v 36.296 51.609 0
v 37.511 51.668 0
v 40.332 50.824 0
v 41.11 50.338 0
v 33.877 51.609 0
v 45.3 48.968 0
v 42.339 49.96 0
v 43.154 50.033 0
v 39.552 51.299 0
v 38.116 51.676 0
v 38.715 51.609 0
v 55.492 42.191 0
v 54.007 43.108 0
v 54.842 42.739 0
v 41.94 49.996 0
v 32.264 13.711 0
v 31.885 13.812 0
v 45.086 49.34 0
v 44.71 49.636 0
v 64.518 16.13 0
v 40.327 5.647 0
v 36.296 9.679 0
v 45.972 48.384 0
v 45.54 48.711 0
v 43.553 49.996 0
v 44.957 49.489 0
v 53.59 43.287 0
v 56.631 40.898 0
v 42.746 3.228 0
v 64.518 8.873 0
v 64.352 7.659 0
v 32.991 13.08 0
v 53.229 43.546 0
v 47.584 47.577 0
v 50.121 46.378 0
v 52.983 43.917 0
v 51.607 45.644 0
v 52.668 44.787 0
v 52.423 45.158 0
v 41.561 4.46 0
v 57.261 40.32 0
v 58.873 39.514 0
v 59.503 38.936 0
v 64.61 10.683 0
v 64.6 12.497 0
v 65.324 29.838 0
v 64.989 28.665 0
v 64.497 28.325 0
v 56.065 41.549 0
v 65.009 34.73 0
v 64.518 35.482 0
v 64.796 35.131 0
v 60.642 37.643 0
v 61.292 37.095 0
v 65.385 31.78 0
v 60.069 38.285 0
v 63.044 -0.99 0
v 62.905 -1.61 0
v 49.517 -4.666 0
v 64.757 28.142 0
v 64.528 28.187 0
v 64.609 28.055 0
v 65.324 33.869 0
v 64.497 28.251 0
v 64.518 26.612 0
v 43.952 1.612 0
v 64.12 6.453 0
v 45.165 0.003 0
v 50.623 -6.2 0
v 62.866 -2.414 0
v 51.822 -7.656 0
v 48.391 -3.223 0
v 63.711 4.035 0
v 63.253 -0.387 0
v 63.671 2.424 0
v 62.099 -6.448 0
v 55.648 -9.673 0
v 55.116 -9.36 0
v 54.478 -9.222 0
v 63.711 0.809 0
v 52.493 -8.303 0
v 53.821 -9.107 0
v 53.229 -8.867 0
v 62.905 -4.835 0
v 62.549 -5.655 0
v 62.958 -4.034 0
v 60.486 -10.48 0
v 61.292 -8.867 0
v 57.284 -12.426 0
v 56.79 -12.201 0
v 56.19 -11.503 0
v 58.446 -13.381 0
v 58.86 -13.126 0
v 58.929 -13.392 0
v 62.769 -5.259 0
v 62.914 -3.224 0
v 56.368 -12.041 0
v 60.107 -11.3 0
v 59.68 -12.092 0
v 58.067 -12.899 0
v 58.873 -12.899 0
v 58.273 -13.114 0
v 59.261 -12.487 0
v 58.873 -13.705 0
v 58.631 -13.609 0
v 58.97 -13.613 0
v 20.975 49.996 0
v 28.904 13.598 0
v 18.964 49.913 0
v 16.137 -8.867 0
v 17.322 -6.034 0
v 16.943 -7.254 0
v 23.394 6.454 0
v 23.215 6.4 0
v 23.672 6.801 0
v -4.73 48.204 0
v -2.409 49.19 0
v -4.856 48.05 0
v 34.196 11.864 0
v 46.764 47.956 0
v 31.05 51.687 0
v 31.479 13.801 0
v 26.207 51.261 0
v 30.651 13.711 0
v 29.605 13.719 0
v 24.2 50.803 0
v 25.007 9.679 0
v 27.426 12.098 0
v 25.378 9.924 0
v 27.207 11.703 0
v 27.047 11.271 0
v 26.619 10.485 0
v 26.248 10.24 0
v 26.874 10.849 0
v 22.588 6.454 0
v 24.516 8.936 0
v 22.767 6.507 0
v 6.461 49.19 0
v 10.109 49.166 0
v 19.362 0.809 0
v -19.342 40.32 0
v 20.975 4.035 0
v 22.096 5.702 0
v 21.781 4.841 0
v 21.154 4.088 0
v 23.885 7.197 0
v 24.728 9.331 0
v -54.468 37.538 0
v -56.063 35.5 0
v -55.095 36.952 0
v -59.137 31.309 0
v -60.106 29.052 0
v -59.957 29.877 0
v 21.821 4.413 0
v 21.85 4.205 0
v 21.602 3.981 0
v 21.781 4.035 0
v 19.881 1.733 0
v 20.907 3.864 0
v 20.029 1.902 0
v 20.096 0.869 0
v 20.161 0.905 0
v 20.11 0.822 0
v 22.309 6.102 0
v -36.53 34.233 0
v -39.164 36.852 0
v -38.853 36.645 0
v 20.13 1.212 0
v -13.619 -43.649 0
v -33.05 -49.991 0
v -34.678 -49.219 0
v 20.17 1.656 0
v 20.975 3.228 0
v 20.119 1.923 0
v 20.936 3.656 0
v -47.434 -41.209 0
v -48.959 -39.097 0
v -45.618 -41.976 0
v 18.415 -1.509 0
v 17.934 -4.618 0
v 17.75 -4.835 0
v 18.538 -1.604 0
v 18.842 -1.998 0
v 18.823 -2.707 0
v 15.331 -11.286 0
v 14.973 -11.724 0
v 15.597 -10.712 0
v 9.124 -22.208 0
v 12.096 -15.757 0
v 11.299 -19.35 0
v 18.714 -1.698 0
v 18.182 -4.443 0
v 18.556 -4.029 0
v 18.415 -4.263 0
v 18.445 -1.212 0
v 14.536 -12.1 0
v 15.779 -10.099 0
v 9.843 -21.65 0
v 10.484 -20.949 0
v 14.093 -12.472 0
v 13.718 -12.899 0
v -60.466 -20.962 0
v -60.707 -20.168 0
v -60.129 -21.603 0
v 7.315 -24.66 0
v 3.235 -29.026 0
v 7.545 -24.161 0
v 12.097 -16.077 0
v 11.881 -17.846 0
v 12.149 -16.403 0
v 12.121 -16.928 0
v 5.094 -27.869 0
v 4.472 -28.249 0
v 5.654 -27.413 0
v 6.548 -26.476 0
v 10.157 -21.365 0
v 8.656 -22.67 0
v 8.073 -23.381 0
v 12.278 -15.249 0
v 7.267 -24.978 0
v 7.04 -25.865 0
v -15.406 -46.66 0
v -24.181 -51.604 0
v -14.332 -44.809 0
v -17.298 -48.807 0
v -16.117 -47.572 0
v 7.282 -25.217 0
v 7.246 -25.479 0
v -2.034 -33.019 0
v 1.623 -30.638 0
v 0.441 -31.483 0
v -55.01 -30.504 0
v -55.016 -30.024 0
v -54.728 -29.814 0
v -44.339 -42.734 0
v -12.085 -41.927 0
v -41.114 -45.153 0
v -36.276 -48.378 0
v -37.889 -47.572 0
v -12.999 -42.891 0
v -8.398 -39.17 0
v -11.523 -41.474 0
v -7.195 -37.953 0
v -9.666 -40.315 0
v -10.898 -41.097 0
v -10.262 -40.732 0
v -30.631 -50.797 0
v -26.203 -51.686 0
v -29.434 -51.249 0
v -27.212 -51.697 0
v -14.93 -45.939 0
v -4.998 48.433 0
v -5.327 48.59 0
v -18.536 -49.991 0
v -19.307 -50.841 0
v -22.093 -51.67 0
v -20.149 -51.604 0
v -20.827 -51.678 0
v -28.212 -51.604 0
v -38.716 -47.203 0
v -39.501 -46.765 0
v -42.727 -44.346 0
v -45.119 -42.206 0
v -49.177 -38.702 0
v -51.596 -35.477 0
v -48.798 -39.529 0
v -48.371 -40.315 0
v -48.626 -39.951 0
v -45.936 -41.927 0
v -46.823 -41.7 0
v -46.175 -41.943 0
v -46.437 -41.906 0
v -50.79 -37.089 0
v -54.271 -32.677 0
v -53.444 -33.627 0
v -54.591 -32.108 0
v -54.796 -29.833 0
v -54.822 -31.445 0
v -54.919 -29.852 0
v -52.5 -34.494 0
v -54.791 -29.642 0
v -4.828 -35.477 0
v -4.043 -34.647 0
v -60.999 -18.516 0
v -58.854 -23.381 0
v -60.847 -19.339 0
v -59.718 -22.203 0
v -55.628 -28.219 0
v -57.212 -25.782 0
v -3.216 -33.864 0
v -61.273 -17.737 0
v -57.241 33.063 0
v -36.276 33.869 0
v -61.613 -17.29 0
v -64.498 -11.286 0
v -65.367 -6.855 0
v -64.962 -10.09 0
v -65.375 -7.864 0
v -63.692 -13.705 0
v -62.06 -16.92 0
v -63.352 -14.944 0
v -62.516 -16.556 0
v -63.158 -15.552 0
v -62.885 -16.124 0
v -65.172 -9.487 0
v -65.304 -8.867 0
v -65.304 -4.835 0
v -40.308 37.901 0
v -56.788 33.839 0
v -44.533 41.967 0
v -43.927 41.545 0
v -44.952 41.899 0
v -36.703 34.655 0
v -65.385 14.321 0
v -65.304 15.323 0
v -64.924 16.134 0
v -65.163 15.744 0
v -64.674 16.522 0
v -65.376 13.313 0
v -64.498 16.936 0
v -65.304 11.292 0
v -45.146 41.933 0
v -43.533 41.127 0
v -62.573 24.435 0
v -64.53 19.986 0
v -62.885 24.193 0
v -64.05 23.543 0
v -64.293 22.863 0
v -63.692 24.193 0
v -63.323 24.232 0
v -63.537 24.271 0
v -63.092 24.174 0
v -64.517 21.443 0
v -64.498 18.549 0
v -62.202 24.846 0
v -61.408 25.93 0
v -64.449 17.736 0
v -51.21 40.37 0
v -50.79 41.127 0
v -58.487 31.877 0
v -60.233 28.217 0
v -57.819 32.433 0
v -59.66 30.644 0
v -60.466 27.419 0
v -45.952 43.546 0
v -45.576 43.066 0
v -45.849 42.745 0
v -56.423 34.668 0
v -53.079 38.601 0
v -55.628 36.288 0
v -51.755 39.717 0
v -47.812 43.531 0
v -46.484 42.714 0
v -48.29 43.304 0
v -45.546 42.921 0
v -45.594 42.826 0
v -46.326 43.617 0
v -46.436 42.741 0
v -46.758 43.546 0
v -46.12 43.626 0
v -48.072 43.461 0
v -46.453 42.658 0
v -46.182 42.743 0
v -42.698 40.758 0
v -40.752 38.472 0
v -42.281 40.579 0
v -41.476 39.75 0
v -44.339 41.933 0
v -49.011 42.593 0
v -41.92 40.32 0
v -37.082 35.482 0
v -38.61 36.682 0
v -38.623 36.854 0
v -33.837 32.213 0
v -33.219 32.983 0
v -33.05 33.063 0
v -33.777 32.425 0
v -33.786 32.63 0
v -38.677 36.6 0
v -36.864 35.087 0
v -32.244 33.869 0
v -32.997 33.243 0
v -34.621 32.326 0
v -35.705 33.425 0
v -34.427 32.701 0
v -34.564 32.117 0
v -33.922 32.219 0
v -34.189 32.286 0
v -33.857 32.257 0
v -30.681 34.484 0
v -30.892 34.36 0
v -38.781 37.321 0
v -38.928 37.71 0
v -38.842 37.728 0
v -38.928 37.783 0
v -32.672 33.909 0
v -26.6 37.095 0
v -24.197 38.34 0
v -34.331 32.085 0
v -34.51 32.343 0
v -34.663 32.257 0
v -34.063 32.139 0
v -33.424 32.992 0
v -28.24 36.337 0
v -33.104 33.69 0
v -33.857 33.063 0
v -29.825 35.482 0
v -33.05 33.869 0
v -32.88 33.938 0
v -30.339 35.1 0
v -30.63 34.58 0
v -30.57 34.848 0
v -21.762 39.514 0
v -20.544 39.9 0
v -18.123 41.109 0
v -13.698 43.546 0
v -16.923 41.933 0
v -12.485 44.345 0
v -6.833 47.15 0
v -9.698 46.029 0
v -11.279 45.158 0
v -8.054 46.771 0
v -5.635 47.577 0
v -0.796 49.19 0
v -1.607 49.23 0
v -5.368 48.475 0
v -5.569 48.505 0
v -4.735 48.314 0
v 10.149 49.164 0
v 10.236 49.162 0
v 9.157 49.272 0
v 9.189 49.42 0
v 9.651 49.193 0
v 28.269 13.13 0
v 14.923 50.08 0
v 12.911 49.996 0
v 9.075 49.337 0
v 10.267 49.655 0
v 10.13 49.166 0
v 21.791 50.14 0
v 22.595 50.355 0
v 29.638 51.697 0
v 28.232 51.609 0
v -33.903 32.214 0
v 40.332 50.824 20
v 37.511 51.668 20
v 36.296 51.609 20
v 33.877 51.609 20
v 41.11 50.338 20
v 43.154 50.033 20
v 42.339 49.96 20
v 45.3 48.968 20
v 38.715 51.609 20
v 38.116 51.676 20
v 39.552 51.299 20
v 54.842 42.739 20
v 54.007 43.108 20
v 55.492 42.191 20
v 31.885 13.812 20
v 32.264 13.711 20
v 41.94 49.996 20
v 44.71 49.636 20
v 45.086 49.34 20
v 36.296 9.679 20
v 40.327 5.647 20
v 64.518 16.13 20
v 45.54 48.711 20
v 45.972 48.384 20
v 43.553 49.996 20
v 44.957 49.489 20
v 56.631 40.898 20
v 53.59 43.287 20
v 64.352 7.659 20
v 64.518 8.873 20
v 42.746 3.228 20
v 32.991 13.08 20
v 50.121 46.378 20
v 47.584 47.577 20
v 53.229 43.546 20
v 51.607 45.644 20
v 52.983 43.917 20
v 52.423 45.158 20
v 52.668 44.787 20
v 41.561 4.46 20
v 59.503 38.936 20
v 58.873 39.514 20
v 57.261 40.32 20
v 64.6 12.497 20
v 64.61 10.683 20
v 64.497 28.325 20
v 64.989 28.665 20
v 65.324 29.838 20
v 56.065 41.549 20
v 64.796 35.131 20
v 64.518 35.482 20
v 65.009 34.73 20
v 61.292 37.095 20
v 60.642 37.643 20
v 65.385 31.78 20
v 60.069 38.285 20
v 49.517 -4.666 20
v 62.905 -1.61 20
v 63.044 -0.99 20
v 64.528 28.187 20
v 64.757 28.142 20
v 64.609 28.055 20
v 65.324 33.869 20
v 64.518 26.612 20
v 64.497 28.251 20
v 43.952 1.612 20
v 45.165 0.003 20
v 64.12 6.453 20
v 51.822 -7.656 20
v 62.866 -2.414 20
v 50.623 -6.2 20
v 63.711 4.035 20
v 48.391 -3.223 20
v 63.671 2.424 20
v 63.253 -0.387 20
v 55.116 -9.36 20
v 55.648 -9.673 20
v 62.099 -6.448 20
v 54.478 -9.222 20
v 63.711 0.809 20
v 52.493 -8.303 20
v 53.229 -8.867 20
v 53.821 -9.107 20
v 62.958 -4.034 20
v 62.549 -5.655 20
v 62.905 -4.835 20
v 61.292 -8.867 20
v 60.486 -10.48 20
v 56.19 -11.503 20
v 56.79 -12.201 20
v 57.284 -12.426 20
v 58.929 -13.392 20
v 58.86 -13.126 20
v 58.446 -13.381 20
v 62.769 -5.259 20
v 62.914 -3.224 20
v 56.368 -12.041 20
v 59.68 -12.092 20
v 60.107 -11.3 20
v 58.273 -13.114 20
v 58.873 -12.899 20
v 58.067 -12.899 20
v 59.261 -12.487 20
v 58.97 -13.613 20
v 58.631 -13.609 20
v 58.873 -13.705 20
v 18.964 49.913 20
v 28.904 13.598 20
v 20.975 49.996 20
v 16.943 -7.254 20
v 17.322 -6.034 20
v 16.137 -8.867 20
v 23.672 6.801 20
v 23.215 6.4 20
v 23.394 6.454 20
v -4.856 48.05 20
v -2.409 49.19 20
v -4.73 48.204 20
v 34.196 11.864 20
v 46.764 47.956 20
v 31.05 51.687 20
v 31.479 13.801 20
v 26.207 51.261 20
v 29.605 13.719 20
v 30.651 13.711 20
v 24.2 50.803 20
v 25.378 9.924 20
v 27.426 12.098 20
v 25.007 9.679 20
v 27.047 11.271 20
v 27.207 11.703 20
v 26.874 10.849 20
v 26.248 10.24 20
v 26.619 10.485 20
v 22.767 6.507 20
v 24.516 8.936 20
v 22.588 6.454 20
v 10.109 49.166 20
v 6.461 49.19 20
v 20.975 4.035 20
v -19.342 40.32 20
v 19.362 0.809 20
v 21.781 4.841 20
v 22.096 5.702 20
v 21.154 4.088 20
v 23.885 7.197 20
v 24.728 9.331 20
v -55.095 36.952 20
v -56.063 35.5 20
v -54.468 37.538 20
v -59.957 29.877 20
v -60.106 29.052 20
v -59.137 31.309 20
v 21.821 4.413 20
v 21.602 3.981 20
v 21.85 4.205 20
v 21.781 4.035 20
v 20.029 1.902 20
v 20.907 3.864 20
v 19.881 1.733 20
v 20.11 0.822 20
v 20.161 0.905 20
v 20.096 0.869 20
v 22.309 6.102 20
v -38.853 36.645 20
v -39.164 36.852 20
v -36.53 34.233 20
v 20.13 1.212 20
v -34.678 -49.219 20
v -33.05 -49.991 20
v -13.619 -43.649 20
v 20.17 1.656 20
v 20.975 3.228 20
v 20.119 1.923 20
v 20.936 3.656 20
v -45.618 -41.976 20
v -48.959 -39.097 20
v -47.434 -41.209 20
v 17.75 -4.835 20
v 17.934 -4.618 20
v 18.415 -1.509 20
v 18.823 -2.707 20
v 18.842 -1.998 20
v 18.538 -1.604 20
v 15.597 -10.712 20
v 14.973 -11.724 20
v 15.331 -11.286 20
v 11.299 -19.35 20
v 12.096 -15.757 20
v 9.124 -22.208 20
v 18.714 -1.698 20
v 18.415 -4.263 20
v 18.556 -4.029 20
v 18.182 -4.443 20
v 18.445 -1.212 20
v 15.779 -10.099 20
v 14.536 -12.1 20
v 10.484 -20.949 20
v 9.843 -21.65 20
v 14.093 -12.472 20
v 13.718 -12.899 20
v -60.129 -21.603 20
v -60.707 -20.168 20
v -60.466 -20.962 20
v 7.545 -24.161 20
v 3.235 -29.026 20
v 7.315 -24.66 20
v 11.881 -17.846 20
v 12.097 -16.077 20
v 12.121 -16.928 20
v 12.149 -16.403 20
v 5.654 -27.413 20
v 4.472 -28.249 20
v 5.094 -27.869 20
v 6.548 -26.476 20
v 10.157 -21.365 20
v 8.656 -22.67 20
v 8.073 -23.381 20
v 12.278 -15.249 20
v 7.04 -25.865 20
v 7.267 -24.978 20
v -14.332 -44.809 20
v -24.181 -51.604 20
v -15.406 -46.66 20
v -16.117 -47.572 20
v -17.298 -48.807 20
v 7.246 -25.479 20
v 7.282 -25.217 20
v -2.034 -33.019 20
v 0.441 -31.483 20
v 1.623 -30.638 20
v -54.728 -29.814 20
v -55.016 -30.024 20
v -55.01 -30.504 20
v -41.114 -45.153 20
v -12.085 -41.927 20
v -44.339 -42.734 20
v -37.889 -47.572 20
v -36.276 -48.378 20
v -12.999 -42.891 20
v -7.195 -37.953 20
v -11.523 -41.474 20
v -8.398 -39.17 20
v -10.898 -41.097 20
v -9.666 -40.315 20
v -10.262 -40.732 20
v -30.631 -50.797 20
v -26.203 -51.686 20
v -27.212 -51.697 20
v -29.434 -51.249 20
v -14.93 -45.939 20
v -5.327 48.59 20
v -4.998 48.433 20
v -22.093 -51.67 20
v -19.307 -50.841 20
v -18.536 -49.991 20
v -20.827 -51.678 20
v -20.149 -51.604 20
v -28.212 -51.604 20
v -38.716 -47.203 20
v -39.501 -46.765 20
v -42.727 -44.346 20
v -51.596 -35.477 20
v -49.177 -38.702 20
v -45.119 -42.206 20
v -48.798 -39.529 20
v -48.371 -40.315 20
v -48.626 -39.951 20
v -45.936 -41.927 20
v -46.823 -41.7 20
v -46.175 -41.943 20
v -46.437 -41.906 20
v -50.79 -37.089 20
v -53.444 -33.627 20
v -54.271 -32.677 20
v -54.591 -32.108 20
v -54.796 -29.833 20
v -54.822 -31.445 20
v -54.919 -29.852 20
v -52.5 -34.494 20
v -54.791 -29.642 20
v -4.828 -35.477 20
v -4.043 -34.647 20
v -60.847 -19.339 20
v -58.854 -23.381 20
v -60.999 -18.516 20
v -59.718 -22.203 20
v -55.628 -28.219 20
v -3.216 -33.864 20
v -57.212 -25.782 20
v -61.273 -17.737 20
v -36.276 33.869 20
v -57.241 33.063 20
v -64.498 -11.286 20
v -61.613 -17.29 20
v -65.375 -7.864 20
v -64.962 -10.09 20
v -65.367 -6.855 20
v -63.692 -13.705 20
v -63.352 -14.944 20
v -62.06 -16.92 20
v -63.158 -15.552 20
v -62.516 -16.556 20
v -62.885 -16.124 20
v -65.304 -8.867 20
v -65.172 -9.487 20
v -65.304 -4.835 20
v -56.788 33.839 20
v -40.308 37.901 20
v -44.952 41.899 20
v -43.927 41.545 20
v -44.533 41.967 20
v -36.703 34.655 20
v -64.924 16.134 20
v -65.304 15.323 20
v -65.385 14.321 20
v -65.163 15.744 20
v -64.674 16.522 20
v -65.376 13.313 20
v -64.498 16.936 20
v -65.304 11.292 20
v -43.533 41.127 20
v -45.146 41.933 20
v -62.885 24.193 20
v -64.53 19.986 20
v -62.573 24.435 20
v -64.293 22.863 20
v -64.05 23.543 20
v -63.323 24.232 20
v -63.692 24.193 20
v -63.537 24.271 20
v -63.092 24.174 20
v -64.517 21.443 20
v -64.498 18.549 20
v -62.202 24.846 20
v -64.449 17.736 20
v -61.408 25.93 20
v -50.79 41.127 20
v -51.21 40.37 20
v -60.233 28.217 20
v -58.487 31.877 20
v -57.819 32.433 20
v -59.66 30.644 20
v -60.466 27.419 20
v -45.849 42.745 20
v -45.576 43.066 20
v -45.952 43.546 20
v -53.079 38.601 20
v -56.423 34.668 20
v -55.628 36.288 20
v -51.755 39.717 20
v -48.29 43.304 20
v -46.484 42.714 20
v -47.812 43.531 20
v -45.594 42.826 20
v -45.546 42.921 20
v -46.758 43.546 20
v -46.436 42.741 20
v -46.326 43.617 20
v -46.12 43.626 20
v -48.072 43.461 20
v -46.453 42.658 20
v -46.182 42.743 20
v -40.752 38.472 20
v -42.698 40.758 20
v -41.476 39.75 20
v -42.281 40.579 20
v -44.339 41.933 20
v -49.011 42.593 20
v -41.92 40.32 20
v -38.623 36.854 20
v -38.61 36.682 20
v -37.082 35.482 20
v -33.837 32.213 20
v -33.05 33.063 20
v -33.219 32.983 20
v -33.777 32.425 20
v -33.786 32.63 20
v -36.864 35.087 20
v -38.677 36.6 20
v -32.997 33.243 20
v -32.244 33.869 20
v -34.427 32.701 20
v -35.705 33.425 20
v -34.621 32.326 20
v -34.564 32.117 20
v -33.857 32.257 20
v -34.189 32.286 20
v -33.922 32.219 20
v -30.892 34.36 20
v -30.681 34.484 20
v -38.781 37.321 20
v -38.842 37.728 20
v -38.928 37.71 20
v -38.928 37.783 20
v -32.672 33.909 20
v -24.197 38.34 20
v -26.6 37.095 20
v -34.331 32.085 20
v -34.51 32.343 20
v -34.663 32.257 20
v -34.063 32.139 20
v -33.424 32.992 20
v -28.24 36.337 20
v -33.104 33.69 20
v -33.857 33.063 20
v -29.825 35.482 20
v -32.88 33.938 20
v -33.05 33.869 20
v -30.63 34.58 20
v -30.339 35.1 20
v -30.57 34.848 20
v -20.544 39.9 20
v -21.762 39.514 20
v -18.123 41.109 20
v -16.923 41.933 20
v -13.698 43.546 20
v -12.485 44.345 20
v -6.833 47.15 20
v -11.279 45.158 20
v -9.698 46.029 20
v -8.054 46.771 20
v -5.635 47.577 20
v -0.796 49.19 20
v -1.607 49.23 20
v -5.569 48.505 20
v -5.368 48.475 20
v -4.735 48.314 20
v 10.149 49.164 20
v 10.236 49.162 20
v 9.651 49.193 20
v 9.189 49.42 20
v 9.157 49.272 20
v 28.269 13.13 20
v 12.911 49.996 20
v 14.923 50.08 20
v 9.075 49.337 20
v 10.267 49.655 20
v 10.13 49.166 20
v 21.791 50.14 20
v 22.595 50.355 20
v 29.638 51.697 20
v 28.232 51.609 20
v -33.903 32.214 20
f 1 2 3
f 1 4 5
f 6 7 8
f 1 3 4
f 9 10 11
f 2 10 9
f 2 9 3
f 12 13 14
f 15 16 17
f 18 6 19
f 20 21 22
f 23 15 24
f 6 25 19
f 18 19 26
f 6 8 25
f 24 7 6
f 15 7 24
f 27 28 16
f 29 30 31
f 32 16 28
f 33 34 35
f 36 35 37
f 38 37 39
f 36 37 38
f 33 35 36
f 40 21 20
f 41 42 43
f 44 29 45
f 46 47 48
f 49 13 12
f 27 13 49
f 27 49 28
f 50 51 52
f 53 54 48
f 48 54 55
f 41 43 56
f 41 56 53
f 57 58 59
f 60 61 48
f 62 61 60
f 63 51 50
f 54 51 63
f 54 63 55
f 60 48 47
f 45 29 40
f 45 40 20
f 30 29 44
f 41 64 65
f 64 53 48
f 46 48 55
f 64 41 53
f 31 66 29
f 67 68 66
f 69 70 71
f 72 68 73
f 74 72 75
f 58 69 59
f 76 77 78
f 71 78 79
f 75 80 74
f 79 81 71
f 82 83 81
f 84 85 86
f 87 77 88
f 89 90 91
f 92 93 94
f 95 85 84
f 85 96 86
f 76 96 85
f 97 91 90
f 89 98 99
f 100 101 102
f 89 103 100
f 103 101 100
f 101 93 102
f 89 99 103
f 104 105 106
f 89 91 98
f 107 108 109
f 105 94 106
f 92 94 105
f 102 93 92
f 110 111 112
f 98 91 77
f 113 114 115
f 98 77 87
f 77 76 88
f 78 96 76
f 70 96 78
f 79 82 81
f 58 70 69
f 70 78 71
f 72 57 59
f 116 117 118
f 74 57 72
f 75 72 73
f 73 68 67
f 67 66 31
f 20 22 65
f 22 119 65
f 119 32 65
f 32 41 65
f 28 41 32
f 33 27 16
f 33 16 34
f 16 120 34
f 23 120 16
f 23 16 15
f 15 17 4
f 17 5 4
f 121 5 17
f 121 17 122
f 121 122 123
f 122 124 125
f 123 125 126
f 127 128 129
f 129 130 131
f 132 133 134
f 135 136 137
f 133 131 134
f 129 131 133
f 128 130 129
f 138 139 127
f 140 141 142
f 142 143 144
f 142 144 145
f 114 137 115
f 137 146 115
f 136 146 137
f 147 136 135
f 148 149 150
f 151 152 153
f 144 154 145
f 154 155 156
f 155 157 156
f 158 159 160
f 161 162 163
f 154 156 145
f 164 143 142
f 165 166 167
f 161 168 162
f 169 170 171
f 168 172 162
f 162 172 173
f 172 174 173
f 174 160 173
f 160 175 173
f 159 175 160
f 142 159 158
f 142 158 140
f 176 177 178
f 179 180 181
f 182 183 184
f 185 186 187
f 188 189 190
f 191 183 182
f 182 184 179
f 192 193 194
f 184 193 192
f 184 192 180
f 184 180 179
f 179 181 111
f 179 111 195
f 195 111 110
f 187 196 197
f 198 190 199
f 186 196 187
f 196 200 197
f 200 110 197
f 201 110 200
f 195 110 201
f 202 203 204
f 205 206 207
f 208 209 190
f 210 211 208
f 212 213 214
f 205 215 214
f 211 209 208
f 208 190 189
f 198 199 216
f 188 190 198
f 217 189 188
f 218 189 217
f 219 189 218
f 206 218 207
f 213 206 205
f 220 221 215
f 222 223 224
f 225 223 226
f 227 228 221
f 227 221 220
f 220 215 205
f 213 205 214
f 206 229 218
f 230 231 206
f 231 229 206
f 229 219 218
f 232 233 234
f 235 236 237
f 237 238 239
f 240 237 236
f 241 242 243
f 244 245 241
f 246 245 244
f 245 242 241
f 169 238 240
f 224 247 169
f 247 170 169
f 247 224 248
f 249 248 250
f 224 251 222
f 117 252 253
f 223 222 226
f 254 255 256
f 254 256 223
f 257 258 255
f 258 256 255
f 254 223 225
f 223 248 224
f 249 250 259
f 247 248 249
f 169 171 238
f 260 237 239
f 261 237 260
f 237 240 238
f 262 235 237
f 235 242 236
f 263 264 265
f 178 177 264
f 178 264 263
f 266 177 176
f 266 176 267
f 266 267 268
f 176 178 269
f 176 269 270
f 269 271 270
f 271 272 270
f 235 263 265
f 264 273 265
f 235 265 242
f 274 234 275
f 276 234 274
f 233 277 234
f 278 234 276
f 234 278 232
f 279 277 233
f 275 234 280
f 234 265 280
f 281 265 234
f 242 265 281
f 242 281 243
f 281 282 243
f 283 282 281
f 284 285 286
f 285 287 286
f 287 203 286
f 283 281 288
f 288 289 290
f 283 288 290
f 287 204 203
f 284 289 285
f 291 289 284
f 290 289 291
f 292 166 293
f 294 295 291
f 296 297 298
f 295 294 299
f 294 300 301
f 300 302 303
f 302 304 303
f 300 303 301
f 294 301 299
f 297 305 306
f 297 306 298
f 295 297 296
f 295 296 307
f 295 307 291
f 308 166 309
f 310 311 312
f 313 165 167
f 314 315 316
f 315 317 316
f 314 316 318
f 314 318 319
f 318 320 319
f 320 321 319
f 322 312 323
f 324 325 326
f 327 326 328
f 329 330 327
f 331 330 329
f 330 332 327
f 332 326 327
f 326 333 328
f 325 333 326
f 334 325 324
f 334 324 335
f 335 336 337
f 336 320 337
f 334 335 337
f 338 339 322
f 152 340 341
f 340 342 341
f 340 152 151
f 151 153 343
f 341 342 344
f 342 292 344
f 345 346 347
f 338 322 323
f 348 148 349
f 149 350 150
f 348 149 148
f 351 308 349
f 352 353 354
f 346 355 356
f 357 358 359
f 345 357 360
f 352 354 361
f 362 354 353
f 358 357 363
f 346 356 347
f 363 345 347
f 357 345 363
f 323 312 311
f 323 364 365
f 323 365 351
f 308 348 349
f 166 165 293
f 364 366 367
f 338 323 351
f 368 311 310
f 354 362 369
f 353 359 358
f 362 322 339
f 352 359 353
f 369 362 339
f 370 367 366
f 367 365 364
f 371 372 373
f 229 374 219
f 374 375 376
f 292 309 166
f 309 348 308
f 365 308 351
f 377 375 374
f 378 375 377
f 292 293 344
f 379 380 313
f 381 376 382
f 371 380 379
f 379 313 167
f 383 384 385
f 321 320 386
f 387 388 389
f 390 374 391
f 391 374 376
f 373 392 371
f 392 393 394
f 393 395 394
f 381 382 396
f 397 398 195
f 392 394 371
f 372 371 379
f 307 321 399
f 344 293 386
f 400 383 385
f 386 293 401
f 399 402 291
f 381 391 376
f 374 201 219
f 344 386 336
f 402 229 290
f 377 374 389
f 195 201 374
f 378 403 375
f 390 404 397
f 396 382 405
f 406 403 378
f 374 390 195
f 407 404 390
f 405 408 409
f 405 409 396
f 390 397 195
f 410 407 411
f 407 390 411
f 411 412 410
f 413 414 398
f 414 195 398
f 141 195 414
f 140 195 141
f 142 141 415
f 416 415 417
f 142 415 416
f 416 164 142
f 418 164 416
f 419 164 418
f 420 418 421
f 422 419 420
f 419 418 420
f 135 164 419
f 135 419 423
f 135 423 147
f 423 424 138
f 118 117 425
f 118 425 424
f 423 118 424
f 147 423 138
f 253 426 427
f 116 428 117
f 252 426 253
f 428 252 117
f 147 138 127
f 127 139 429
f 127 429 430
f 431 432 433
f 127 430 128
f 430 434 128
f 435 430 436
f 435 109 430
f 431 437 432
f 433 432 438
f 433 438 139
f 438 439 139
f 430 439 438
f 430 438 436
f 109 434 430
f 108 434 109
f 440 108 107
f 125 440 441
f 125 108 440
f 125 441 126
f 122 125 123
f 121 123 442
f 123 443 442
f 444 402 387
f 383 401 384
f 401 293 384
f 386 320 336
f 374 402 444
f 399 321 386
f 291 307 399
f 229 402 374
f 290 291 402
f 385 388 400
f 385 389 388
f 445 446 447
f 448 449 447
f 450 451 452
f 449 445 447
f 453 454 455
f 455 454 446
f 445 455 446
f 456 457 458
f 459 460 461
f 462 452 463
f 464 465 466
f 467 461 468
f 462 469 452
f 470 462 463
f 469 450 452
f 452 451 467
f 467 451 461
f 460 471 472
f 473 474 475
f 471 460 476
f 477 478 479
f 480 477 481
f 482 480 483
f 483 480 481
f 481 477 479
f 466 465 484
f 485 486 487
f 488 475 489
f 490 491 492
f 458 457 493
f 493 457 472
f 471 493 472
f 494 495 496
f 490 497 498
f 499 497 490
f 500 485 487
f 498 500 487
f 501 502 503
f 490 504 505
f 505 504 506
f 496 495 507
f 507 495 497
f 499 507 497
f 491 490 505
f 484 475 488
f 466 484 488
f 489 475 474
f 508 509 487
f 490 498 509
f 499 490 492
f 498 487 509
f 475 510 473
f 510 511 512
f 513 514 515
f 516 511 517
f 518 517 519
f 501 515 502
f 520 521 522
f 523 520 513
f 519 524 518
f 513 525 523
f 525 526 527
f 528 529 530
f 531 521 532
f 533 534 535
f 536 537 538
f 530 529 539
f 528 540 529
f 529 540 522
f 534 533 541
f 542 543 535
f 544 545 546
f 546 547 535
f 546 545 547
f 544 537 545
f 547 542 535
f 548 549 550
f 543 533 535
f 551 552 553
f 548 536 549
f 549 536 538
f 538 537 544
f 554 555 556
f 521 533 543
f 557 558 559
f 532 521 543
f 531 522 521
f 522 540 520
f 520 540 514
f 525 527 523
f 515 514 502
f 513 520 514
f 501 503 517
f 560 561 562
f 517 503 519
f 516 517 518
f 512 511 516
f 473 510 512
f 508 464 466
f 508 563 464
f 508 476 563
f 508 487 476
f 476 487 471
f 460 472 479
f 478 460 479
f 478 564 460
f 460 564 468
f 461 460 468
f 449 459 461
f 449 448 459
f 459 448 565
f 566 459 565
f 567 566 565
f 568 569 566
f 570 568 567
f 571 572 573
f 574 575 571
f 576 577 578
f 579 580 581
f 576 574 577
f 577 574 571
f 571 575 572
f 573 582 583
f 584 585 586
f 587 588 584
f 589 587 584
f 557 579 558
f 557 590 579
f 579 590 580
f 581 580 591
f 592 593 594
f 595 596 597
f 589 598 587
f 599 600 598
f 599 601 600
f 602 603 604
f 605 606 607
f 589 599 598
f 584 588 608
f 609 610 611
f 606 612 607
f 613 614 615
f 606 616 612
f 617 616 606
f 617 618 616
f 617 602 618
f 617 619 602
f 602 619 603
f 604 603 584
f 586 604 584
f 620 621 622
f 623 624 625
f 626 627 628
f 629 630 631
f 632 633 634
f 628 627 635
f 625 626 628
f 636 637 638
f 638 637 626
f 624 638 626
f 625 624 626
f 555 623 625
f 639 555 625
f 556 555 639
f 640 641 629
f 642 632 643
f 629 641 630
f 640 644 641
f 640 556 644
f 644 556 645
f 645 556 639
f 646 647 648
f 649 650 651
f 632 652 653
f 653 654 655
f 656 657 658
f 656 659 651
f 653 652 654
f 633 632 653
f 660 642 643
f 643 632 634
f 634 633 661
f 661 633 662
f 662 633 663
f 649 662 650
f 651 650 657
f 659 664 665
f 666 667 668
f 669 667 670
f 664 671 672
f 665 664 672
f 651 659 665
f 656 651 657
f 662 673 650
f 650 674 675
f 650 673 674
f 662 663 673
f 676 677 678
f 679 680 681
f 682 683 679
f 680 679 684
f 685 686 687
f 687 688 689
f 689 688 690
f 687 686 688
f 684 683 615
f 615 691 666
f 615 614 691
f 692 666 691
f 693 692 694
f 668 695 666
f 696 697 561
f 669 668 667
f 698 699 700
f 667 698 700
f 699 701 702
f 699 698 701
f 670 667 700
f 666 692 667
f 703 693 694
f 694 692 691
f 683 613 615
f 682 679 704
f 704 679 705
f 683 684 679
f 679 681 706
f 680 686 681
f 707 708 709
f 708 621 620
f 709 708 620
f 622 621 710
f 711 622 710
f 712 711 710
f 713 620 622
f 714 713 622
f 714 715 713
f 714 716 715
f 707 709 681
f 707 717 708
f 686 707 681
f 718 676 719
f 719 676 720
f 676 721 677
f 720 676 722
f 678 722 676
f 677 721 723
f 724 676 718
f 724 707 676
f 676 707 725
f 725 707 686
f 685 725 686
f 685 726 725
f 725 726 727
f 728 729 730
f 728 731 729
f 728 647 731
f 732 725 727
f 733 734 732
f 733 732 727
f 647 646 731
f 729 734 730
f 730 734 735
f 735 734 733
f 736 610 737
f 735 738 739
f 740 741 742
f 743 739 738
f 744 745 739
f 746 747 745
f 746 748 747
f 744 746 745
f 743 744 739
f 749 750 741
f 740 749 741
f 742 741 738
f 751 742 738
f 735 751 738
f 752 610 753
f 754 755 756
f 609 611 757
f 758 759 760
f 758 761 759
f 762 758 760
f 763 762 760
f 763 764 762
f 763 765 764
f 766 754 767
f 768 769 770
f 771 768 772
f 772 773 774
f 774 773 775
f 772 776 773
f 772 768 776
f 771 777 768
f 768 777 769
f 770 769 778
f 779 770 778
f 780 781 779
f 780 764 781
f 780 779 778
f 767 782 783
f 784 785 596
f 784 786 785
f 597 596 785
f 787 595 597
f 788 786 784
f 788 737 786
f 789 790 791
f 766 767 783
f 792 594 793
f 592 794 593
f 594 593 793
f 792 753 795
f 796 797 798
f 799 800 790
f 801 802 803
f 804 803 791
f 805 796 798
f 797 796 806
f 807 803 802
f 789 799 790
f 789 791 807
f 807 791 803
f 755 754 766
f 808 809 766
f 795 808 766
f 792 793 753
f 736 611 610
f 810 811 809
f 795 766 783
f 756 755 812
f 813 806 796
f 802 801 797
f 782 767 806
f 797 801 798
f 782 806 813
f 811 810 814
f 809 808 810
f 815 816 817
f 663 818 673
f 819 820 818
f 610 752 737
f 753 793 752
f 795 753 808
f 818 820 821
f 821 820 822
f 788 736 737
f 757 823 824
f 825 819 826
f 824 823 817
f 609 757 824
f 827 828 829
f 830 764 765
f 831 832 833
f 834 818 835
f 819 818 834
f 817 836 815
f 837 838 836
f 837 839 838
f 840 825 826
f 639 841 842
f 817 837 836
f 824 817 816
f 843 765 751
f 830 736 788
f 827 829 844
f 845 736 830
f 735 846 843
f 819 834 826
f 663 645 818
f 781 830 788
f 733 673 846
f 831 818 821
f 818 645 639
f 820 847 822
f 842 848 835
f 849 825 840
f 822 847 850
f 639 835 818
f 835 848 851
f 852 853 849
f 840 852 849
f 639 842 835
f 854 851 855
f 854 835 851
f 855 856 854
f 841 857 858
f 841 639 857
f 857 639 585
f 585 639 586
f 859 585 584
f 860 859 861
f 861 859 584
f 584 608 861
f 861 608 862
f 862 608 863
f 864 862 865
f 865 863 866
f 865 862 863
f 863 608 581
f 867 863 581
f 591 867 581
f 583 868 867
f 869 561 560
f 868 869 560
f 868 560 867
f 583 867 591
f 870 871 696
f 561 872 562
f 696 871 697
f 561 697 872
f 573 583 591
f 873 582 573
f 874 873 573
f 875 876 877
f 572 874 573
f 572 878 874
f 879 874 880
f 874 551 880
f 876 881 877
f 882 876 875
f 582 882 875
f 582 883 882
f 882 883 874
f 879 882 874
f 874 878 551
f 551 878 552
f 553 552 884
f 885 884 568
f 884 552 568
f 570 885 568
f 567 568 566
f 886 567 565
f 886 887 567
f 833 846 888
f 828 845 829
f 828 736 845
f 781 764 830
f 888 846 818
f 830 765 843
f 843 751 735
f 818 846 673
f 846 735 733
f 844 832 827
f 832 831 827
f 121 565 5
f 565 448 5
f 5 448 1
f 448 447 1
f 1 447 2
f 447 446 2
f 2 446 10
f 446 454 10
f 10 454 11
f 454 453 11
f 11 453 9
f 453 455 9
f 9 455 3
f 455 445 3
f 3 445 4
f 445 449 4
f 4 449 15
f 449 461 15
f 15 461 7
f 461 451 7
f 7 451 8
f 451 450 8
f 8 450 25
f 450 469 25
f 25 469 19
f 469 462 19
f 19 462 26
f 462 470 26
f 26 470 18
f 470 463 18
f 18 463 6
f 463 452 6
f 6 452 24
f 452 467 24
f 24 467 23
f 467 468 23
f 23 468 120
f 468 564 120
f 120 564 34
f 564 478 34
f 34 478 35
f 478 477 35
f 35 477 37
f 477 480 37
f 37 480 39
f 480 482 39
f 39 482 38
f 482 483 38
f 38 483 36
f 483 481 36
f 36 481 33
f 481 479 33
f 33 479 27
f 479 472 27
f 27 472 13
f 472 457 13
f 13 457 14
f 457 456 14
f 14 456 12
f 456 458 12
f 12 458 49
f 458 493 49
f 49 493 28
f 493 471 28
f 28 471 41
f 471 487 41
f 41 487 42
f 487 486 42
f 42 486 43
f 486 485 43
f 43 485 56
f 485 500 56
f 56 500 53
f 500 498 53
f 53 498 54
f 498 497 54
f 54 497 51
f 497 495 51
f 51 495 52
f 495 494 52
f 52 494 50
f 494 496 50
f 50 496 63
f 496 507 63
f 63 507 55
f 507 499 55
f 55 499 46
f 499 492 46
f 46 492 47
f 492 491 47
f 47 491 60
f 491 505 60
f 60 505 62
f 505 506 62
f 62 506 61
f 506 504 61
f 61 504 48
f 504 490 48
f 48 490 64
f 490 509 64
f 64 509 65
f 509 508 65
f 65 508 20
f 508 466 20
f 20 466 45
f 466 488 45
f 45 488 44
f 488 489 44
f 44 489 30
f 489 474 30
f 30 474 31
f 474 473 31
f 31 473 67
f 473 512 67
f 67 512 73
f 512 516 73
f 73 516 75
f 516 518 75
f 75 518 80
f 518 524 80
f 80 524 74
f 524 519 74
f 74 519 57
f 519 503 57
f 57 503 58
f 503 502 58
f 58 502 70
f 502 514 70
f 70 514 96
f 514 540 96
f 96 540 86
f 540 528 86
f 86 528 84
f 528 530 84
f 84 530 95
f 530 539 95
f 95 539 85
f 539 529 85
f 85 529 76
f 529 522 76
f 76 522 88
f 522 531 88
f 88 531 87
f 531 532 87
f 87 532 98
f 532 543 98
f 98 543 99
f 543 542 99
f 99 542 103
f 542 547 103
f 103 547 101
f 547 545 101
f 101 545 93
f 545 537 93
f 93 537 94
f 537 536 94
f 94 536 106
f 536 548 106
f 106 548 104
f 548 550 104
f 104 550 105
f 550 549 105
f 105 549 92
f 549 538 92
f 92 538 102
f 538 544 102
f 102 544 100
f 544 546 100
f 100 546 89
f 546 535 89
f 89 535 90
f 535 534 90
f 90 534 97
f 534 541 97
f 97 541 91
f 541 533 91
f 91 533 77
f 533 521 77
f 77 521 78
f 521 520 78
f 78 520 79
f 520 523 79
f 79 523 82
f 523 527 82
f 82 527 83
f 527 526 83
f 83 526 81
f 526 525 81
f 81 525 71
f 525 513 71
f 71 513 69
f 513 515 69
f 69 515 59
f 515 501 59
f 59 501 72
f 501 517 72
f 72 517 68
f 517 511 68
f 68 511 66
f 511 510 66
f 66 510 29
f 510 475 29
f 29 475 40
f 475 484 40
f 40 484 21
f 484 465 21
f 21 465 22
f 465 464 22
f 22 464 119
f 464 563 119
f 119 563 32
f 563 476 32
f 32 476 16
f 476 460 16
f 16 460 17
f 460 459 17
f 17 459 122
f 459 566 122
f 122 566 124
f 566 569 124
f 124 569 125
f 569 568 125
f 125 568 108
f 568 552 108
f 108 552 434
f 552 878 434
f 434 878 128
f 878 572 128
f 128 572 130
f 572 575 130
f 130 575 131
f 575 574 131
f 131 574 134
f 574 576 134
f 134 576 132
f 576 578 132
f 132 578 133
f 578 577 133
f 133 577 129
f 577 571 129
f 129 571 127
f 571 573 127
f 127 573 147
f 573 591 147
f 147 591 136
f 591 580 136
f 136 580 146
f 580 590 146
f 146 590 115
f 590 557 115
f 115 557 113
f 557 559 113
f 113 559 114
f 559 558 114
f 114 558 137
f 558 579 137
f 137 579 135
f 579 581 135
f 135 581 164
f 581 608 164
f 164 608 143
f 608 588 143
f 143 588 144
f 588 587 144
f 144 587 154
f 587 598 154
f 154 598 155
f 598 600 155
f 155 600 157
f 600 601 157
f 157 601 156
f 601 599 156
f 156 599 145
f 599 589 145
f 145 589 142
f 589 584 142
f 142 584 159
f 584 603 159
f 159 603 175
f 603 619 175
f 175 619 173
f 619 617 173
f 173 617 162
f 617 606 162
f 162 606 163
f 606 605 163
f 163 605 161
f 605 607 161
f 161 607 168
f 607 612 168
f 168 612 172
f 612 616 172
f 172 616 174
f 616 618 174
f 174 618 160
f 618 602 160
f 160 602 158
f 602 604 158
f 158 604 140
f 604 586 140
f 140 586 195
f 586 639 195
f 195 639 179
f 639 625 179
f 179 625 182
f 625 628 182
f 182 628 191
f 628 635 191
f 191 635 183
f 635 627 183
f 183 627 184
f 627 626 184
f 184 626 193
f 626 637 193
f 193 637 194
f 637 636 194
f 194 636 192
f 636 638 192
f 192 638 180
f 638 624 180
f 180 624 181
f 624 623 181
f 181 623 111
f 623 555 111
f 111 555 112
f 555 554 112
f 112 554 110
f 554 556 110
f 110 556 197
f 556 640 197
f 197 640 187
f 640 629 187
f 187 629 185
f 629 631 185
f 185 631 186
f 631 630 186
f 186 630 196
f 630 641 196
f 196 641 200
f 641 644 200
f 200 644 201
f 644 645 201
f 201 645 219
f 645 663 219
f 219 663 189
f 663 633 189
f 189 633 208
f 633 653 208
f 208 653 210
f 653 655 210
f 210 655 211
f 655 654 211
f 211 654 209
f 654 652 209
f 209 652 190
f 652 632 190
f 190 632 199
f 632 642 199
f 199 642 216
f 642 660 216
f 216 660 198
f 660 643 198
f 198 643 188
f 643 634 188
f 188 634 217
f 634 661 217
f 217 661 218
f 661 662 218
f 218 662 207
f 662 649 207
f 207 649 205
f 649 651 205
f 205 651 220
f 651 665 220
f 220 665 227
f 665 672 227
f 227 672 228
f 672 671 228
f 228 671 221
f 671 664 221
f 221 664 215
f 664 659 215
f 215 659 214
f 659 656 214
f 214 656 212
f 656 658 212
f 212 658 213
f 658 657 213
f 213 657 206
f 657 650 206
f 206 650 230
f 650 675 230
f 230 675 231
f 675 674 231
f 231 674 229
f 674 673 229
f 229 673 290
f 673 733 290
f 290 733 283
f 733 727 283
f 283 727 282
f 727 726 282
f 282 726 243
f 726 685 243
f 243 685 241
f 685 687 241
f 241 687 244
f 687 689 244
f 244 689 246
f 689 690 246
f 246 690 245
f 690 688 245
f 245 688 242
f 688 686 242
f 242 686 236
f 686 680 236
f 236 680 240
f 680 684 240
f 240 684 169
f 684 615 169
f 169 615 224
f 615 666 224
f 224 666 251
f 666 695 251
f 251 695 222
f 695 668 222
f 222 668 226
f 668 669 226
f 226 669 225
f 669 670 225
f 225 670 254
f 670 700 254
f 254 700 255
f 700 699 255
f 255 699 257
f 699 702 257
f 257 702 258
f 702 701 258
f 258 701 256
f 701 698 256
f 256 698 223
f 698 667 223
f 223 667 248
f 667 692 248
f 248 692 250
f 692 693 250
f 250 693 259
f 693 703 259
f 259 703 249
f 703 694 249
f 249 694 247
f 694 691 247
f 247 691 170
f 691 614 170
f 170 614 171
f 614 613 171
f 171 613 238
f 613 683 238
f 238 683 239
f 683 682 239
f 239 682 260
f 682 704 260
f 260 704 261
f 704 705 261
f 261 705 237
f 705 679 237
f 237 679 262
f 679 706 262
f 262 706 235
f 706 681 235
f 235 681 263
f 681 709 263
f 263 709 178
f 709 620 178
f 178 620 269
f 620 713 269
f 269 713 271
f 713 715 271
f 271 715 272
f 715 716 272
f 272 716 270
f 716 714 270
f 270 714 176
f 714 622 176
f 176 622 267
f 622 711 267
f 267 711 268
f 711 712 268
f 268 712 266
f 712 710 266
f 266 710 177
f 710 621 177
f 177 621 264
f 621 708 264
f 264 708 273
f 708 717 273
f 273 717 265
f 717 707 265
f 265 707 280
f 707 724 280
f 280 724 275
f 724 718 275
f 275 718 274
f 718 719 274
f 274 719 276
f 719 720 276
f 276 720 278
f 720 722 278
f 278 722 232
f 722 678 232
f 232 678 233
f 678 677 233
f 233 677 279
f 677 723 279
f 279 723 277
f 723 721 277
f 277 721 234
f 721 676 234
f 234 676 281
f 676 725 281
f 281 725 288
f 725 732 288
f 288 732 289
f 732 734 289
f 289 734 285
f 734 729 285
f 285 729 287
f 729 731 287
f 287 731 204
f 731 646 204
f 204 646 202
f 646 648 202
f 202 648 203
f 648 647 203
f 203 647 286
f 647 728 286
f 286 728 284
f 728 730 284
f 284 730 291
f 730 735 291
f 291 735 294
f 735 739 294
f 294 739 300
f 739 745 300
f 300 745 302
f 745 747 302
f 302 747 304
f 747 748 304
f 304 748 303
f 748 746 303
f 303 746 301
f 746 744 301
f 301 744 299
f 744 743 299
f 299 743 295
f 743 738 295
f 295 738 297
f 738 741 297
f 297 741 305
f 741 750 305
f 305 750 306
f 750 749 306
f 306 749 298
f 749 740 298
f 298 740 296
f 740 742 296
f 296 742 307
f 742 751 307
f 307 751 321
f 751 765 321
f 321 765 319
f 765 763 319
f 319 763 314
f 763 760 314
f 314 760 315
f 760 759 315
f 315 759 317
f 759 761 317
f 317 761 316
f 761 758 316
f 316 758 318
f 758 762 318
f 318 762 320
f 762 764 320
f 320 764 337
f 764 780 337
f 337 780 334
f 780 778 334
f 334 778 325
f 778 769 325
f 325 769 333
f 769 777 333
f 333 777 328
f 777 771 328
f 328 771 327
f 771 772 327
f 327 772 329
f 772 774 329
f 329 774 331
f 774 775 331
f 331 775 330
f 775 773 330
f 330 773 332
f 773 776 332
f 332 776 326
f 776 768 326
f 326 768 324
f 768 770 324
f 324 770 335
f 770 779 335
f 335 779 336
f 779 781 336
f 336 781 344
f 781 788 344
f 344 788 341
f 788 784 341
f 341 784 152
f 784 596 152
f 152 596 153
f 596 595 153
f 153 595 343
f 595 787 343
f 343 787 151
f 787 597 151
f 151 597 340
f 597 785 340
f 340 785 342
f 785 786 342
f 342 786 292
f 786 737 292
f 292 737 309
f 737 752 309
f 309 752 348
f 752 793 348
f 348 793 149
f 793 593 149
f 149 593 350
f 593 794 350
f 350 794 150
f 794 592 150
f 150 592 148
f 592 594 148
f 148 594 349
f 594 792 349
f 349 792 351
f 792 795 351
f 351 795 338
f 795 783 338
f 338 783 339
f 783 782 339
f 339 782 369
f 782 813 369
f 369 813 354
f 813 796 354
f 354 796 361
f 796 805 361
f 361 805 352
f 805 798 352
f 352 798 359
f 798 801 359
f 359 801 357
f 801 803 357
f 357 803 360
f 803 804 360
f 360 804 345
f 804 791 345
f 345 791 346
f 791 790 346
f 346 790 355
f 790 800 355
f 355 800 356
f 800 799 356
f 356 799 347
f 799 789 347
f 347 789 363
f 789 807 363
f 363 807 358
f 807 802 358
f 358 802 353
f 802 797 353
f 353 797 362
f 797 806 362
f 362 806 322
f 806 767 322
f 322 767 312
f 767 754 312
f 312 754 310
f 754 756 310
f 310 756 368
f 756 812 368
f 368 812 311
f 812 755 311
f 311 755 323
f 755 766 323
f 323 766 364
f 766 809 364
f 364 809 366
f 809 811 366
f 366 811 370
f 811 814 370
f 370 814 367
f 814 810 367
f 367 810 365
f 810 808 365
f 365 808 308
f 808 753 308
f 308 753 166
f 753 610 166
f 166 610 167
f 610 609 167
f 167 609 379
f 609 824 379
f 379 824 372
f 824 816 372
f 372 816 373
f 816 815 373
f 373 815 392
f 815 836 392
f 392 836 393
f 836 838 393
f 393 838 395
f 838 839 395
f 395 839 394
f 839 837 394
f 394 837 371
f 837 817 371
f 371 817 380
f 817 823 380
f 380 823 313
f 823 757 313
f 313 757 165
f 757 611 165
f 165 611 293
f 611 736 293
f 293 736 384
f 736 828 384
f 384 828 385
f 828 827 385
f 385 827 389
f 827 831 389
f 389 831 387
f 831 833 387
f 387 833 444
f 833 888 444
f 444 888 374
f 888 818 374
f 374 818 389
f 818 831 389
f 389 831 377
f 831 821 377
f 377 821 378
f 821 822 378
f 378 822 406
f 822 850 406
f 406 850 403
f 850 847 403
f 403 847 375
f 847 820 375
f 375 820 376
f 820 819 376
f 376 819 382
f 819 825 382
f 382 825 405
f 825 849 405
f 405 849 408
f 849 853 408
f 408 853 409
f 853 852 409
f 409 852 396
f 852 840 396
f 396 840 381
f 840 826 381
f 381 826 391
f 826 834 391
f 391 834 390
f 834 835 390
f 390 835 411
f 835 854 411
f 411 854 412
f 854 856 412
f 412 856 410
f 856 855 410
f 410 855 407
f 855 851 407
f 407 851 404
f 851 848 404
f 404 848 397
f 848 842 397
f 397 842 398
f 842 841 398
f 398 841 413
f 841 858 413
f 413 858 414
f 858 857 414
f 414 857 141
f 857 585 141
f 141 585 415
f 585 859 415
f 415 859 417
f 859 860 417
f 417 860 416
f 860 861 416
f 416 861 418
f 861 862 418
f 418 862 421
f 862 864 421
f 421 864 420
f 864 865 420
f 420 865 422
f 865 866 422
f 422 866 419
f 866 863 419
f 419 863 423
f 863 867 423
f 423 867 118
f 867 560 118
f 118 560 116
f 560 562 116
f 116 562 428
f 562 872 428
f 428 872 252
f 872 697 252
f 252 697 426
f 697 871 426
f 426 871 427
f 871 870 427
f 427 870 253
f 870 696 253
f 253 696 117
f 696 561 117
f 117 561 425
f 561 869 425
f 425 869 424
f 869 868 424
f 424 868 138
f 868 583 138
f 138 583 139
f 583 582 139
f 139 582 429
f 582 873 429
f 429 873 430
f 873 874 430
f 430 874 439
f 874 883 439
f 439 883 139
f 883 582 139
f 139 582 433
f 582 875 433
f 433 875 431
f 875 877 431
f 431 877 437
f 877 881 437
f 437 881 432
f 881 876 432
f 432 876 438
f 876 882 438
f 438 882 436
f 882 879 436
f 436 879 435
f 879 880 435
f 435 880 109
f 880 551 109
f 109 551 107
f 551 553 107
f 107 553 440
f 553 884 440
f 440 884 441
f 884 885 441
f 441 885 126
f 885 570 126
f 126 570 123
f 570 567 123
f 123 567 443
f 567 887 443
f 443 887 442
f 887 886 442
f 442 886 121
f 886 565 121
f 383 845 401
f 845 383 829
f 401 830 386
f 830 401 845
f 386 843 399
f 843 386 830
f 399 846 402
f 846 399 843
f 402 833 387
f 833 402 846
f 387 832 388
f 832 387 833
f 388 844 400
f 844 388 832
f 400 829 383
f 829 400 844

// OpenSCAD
// Module names are of the form poly_<inkscape-path-id>().  As a result,
// you can associate a polygon in this OpenSCAD program with the corresponding
// SVG element in the Inkscape document by looking for the XML element with
// the attribute id="inkscape-path-id".

// fudge value is used to ensure that subtracted solids are a tad taller
// in the z dimension than the polygon being subtracted from.  This helps
// keep the resulting .stl file manifold.
fudge = 0.1;

module poly_path3432(h)
{
  scale([25.4/90, -25.4/90, 1]) union()
  {
    linear_extrude(height=h)
      polygon([[-179.964988,-145.724123],[-181.451135,-143.042892],[-183.384710,-140.728465],[-188.074552,-136.774056],[-192.995325,-133.008965],[-195.217563,-130.931186],[-197.107838,-128.581263],[-198.649274,-125.787870],[-199.922597,-122.837721],[-201.217113,-119.902200],[-202.822128,-117.152693],[-204.870301,-114.919635],[-207.236787,-112.949572],[-209.538802,-110.938211],[-211.393558,-108.581263],[-212.444369,-105.864766],[-212.972650,-102.941933],[-213.425670,-99.981623],[-214.250698,-97.152693],[-217.587112,-91.877946],[-220.400507,-88.037836],[-221.714441,-86.581045],[-222.822128,-85.724123],[-223.553637,-85.655874],[-224.372033,-85.861564],[-225.129762,-85.998535],[-225.679268,-85.724123],[-226.947405,-83.419955],[-227.808688,-81.011523],[-228.603835,-75.978493],[-228.650985,-70.818278],[-228.536418,-65.724123],[-228.363176,-62.845652],[-228.536418,-60.009833],[-229.158393,-58.541846],[-230.045737,-57.168511],[-230.892707,-55.787267],[-231.393558,-54.295553],[-231.677662,-50.744313],[-231.646095,-47.170641],[-231.393558,-40.009833],[-231.393558,-28.581263],[-231.393558,5.704447],[-231.393558,17.133017],[-231.615048,24.289669],[-231.642735,27.862822],[-231.393558,31.418737],[-230.923463,33.616984],[-230.182046,35.753686],[-228.536418,39.990167],[-225.679268,48.561597],[-224.474618,52.950297],[-223.788323,55.106026],[-222.822128,57.133017],[-221.513994,58.661536],[-219.897018,59.952857],[-218.314026,61.262830],[-217.107838,62.847307],[-216.138079,65.607181],[-215.600792,68.525194],[-215.102744,71.461407],[-214.250698,74.275877],[-213.055046,76.544908],[-211.600596,78.673747],[-208.536418,82.847307],[-202.718587,91.353213],[-197.107838,99.990167],[-194.140711,105.029505],[-193.916500,105.641799],[-194.160582,105.708817],[-194.594500,105.775289],[-194.939796,106.385947],[-194.918015,108.085519],[-194.250698,111.418737],[-193.432463,113.769811],[-192.299126,115.783722],[-189.368583,119.151317],[-186.021956,122.224050],[-182.822128,125.704447],[-181.393558,128.561592],[-179.964988,131.418737],[-177.107843,134.275877],[-174.250698,137.133017],[-173.476980,138.532855],[-172.907666,140.064348],[-172.295583,141.558749],[-171.393558,142.847307],[-168.072199,146.015604],[-165.907706,147.757353],[-164.541026,148.486274],[-163.613101,148.616091],[-162.764876,148.560523],[-161.637294,148.733294],[-159.871300,149.548125],[-157.107838,151.418737],[-154.250698,154.275877],[-151.393558,157.133017],[-148.536413,158.561592],[-145.679268,159.990167],[-142.822128,162.847307],[-139.964988,165.704447],[-137.183252,167.255039],[-134.250698,168.561597],[-128.536418,171.418737],[-122.876511,174.396983],[-117.107838,177.133017],[-108.536418,179.990167],[-104.293288,181.590209],[-99.964988,182.847307],[-96.420891,183.177572],[-92.846425,183.140876],[-85.679268,182.847307],[-78.282910,183.082046],[-73.794716,183.111388],[-71.393558,182.847307],[-68.410200,180.144118],[-65.679268,177.133017],[-61.292153,172.939909],[-57.107838,168.561597],[-54.587284,165.329726],[-52.901117,162.777606],[-50.783080,158.771327],[-48.255994,154.660183],[-46.058517,151.976981],[-42.822128,148.561597],[-40.829451,146.953516],[-38.615111,145.618273],[-36.361422,144.326120],[-34.250698,142.847307],[-29.756631,138.789749],[-25.494067,134.478684],[-17.107838,125.704447],[-14.325211,122.764057],[-11.393558,119.990167],[-7.206702,116.997824],[-2.822128,114.275878],[1.562445,111.553934],[5.749302,108.561597],[8.606445,105.704452],[11.463582,102.847307],[15.844284,100.096287],[18.048443,98.748578],[20.035012,97.133017],[23.203309,93.811660],[24.945057,91.647169],[25.673979,90.280489],[25.803795,89.352564],[25.748228,88.504339],[25.920999,87.376758],[26.735830,85.610766],[28.606442,82.847307],[30.670380,80.327500],[32.328741,78.688546],[34.876818,76.710974],[35.990578,75.701244],[37.146850,74.230142],[40.035012,68.561597],[42.098863,63.232600],[42.947469,59.980323],[43.046678,58.119528],[42.862337,56.964977],[42.860294,55.831431],[43.506399,54.033653],[48.606442,45.704447],[49.934779,44.190858],[51.504199,42.873009],[53.053314,41.542310],[54.320732,39.990167],[55.263565,37.954613],[55.910923,35.784619],[57.177872,31.418737],[60.035012,25.704447],[61.377955,21.380279],[62.892162,17.133017],[63.546760,16.362118],[64.424104,15.742693],[65.249762,15.104145],[65.749302,14.275877],[66.695209,9.591679],[66.763576,7.080094],[66.309063,6.017865],[65.686332,5.681733],[65.250042,5.348441],[65.354857,4.294729],[68.606442,-2.866983],[70.446156,-6.140697],[70.970442,-6.740155],[71.287422,-6.812413],[71.468690,-5.868518],[71.328407,-4.295399],[71.205021,-3.079442],[71.255430,-2.913645],[71.436981,-3.207033],[74.320732,-11.438403],[74.181130,-12.953254],[74.078976,-13.692072],[74.320732,-14.295553],[74.956561,-14.484954],[75.749298,-14.295549],[76.542037,-14.106147],[77.177872,-14.295553],[77.419627,-14.899028],[77.317473,-15.637843],[77.177872,-17.152693],[78.294292,-20.202757],[79.048010,-21.622950],[80.035012,-22.866983],[80.670846,-23.056384],[81.463587,-22.866979],[82.256327,-22.677577],[82.892162,-22.866983],[83.878855,-24.099212],[84.632056,-25.499734],[85.749302,-28.581264],[86.866548,-31.662797],[87.619748,-33.063321],[88.606442,-34.295553],[89.922820,-35.165497],[91.463587,-35.724119],[93.004354,-36.282743],[94.320732,-37.152693],[95.222752,-38.441251],[95.834835,-39.935652],[96.404151,-41.467145],[97.177872,-42.866983],[100.166675,-46.524382],[102.414332,-48.181494],[104.900901,-48.609921],[108.606442,-48.581263],[111.538995,-48.900703],[112.976995,-48.940633],[114.320732,-48.581263],[116.895871,-46.346455],[121.168173,-42.036338],[128.606442,-34.295553],[142.892162,-20.009833],[147.263203,-15.803138],[151.463582,-11.438403],[155.735527,-5.712193],[160.035012,-0.009833],[165.749297,5.704452],[171.463582,11.418737],[175.453078,16.531691],[179.371858,21.966859],[183.622215,27.127967],[185.997451,29.419411],[188.606442,31.418737],[190.703422,32.270472],[193.033265,32.675182],[195.292554,33.165955],[197.177872,34.275877],[199.098102,40.760367],[199.727832,42.665419],[201.225439,43.232843],[202.974190,44.028009],[205.749302,45.704447],[206.479105,46.466064],[207.093043,47.413188],[207.749396,48.220230],[208.606442,48.561597],[208.948332,48.234957],[208.803864,47.452462],[208.560685,46.510247],[208.606442,45.704447],[209.980727,44.244373],[211.463582,42.847307],[212.977998,40.039981],[214.320732,37.133017],[217.177872,31.418737],[220.035012,22.847307],[221.628887,20.036418],[222.409251,18.634020],[222.892162,17.133017],[223.080612,14.292358],[222.924985,11.423813],[222.752947,8.552728],[222.892162,5.704447],[223.384342,3.509161],[224.123305,1.372131],[225.749302,-2.866983],[225.607154,-8.588356],[225.749302,-14.295553],[227.197353,-22.865118],[228.019809,-27.136517],[228.606442,-31.438403],[228.933825,-37.852126],[228.897449,-44.282348],[228.606442,-57.152693],[228.606442,-94.295553],[228.531296,-100.103165],[228.532508,-100.362517],[228.644148,-99.875881],[228.929646,-99.405988],[229.452432,-99.715575],[230.275934,-101.567375],[231.463582,-105.724123],[231.677662,-112.607021],[231.463582,-120.009833],[230.347169,-123.059901],[229.593449,-124.480091],[228.606442,-125.724123],[217.177872,-131.438403],[214.874815,-133.382325],[212.843594,-135.655482],[210.836654,-137.962957],[208.606442,-140.009833],[205.749302,-141.438408],[202.892162,-142.866983],[200.661949,-144.913859],[198.655009,-147.221333],[196.623788,-149.494487],[194.320732,-151.438403],[191.363807,-152.745268],[189.885402,-153.379962],[188.606442,-154.295553],[187.736493,-155.611927],[187.177872,-157.152693],[186.619250,-158.693459],[185.749302,-160.009833],[182.857964,-161.732373],[177.594924,-164.333131],[168.606442,-168.581263],[165.699487,-169.923996],[162.892162,-171.438403],[161.362773,-172.599610],[160.512661,-173.510269],[159.753407,-174.825656],[159.295832,-175.353239],[158.420672,-175.875988],[154.320732,-177.152693],[152.908155,-177.282622],[151.463587,-177.152693],[150.019019,-177.022764],[148.606442,-177.152693],[145.664852,-178.363884],[142.908829,-180.083976],[140.144470,-181.766999],[137.177872,-182.866983],[135.058421,-183.103372],[132.912962,-183.077107],[128.606442,-182.866983],[120.035012,-182.866983],[110.019723,-183.143062],[105.017810,-183.177572],[100.035012,-182.866983],[92.859933,-181.632351],[85.749302,-180.009833],[80.061075,-178.424442],[77.213866,-177.662275],[74.320732,-177.152693],[67.194257,-176.856894],[60.035017,-177.152693],[52.875776,-177.448492],[45.749302,-177.152693],[36.378962,-175.944339],[32.560099,-175.111118],[32.155821,-174.814568],[32.447431,-174.587064],[34.195677,-174.306214],[35.959554,-174.202603],[36.270704,-174.196648],[35.893781,-174.210265],[22.892162,-174.295553],[-2.822128,-174.295553],[-5.693141,-174.435634],[-8.536418,-174.295553],[-18.876121,-172.170320],[-19.733956,-171.868267],[-19.019181,-171.760511],[-17.708346,-171.612492],[-16.778002,-171.189650],[-16.760686,-170.801871],[-17.204700,-170.257427],[-19.964988,-168.581263],[-24.212247,-167.067058],[-28.536418,-165.724123],[-34.364073,-163.095544],[-39.964988,-160.009833],[-44.236858,-157.129057],[-48.536418,-154.295553],[-54.250703,-151.438404],[-59.964988,-148.581263],[-64.216983,-145.661119],[-68.536418,-142.866983],[-72.794213,-141.378221],[-77.107838,-140.009833],[-85.738492,-135.851802],[-94.250698,-131.438403],[-100.064613,-128.752938],[-105.679268,-125.724123],[-107.499857,-124.368782],[-108.320188,-123.477978],[-108.532498,-122.527221],[-108.710691,-122.185891],[-109.461051,-121.746342],[-114.250698,-120.009833],[-115.765548,-120.149434],[-116.504363,-120.251589],[-117.107838,-120.009833],[-117.297245,-119.374003],[-117.107842,-118.581263],[-116.918438,-117.788523],[-117.107838,-117.152693],[-117.704447,-116.868586],[-118.431811,-116.900153],[-119.964988,-117.152693],[-119.712448,-115.619517],[-119.680881,-114.892156],[-119.964988,-114.295553],[-120.695520,-113.877517],[-121.646095,-113.685871],[-122.470401,-113.799065],[-122.822128,-114.295553],[-122.671739,-114.541369],[-122.280998,-114.602636],[-121.141018,-114.400156],[-120.127309,-114.145374],[-119.894405,-114.141265],[-119.964988,-114.295553],[-121.987176,-115.871312],[-124.250700,-117.152693],[-126.514225,-118.434074],[-128.536418,-120.009833],[-129.438439,-121.298393],[-130.050522,-122.792796],[-130.619838,-124.324290],[-131.393558,-125.724123],[-137.628574,-133.680236],[-137.933302,-133.877853],[-137.933255,-133.617640],[-137.412508,-132.241189],[-136.853679,-130.585820],[-136.806028,-129.976958],[-137.044110,-129.686467],[-137.666343,-129.843714],[-138.771145,-130.578067],[-142.822128,-134.295553],[-144.397888,-136.317741],[-145.679270,-138.581264],[-146.960653,-140.844790],[-148.536418,-142.866983],[-149.815375,-143.782569],[-151.293778,-144.417259],[-154.250698,-145.724123],[-155.647768,-147.206982],[-157.107838,-148.581263],[-157.793848,-148.701053],[-158.536413,-148.581263],[-159.278979,-148.461473],[-159.964988,-148.581263],[-164.596514,-151.151015],[-164.705946,-151.350406],[-164.535724,-151.443307],[-163.635762,-151.451098],[-162.455525,-151.457303],[-161.553909,-151.744836],[-161.382239,-152.082513],[-161.489811,-152.596615],[-162.822128,-154.295553],[-163.418736,-154.579656],[-164.146096,-154.548089],[-165.679268,-154.295553],[-169.411413,-154.241982],[-170.333288,-153.994214],[-171.107842,-153.438411],[-173.661415,-150.920553],[-179.964988,-145.724123]]);
  }
}

module doodle(h)
{

poly_path3432(h);
}

doodle(20);
